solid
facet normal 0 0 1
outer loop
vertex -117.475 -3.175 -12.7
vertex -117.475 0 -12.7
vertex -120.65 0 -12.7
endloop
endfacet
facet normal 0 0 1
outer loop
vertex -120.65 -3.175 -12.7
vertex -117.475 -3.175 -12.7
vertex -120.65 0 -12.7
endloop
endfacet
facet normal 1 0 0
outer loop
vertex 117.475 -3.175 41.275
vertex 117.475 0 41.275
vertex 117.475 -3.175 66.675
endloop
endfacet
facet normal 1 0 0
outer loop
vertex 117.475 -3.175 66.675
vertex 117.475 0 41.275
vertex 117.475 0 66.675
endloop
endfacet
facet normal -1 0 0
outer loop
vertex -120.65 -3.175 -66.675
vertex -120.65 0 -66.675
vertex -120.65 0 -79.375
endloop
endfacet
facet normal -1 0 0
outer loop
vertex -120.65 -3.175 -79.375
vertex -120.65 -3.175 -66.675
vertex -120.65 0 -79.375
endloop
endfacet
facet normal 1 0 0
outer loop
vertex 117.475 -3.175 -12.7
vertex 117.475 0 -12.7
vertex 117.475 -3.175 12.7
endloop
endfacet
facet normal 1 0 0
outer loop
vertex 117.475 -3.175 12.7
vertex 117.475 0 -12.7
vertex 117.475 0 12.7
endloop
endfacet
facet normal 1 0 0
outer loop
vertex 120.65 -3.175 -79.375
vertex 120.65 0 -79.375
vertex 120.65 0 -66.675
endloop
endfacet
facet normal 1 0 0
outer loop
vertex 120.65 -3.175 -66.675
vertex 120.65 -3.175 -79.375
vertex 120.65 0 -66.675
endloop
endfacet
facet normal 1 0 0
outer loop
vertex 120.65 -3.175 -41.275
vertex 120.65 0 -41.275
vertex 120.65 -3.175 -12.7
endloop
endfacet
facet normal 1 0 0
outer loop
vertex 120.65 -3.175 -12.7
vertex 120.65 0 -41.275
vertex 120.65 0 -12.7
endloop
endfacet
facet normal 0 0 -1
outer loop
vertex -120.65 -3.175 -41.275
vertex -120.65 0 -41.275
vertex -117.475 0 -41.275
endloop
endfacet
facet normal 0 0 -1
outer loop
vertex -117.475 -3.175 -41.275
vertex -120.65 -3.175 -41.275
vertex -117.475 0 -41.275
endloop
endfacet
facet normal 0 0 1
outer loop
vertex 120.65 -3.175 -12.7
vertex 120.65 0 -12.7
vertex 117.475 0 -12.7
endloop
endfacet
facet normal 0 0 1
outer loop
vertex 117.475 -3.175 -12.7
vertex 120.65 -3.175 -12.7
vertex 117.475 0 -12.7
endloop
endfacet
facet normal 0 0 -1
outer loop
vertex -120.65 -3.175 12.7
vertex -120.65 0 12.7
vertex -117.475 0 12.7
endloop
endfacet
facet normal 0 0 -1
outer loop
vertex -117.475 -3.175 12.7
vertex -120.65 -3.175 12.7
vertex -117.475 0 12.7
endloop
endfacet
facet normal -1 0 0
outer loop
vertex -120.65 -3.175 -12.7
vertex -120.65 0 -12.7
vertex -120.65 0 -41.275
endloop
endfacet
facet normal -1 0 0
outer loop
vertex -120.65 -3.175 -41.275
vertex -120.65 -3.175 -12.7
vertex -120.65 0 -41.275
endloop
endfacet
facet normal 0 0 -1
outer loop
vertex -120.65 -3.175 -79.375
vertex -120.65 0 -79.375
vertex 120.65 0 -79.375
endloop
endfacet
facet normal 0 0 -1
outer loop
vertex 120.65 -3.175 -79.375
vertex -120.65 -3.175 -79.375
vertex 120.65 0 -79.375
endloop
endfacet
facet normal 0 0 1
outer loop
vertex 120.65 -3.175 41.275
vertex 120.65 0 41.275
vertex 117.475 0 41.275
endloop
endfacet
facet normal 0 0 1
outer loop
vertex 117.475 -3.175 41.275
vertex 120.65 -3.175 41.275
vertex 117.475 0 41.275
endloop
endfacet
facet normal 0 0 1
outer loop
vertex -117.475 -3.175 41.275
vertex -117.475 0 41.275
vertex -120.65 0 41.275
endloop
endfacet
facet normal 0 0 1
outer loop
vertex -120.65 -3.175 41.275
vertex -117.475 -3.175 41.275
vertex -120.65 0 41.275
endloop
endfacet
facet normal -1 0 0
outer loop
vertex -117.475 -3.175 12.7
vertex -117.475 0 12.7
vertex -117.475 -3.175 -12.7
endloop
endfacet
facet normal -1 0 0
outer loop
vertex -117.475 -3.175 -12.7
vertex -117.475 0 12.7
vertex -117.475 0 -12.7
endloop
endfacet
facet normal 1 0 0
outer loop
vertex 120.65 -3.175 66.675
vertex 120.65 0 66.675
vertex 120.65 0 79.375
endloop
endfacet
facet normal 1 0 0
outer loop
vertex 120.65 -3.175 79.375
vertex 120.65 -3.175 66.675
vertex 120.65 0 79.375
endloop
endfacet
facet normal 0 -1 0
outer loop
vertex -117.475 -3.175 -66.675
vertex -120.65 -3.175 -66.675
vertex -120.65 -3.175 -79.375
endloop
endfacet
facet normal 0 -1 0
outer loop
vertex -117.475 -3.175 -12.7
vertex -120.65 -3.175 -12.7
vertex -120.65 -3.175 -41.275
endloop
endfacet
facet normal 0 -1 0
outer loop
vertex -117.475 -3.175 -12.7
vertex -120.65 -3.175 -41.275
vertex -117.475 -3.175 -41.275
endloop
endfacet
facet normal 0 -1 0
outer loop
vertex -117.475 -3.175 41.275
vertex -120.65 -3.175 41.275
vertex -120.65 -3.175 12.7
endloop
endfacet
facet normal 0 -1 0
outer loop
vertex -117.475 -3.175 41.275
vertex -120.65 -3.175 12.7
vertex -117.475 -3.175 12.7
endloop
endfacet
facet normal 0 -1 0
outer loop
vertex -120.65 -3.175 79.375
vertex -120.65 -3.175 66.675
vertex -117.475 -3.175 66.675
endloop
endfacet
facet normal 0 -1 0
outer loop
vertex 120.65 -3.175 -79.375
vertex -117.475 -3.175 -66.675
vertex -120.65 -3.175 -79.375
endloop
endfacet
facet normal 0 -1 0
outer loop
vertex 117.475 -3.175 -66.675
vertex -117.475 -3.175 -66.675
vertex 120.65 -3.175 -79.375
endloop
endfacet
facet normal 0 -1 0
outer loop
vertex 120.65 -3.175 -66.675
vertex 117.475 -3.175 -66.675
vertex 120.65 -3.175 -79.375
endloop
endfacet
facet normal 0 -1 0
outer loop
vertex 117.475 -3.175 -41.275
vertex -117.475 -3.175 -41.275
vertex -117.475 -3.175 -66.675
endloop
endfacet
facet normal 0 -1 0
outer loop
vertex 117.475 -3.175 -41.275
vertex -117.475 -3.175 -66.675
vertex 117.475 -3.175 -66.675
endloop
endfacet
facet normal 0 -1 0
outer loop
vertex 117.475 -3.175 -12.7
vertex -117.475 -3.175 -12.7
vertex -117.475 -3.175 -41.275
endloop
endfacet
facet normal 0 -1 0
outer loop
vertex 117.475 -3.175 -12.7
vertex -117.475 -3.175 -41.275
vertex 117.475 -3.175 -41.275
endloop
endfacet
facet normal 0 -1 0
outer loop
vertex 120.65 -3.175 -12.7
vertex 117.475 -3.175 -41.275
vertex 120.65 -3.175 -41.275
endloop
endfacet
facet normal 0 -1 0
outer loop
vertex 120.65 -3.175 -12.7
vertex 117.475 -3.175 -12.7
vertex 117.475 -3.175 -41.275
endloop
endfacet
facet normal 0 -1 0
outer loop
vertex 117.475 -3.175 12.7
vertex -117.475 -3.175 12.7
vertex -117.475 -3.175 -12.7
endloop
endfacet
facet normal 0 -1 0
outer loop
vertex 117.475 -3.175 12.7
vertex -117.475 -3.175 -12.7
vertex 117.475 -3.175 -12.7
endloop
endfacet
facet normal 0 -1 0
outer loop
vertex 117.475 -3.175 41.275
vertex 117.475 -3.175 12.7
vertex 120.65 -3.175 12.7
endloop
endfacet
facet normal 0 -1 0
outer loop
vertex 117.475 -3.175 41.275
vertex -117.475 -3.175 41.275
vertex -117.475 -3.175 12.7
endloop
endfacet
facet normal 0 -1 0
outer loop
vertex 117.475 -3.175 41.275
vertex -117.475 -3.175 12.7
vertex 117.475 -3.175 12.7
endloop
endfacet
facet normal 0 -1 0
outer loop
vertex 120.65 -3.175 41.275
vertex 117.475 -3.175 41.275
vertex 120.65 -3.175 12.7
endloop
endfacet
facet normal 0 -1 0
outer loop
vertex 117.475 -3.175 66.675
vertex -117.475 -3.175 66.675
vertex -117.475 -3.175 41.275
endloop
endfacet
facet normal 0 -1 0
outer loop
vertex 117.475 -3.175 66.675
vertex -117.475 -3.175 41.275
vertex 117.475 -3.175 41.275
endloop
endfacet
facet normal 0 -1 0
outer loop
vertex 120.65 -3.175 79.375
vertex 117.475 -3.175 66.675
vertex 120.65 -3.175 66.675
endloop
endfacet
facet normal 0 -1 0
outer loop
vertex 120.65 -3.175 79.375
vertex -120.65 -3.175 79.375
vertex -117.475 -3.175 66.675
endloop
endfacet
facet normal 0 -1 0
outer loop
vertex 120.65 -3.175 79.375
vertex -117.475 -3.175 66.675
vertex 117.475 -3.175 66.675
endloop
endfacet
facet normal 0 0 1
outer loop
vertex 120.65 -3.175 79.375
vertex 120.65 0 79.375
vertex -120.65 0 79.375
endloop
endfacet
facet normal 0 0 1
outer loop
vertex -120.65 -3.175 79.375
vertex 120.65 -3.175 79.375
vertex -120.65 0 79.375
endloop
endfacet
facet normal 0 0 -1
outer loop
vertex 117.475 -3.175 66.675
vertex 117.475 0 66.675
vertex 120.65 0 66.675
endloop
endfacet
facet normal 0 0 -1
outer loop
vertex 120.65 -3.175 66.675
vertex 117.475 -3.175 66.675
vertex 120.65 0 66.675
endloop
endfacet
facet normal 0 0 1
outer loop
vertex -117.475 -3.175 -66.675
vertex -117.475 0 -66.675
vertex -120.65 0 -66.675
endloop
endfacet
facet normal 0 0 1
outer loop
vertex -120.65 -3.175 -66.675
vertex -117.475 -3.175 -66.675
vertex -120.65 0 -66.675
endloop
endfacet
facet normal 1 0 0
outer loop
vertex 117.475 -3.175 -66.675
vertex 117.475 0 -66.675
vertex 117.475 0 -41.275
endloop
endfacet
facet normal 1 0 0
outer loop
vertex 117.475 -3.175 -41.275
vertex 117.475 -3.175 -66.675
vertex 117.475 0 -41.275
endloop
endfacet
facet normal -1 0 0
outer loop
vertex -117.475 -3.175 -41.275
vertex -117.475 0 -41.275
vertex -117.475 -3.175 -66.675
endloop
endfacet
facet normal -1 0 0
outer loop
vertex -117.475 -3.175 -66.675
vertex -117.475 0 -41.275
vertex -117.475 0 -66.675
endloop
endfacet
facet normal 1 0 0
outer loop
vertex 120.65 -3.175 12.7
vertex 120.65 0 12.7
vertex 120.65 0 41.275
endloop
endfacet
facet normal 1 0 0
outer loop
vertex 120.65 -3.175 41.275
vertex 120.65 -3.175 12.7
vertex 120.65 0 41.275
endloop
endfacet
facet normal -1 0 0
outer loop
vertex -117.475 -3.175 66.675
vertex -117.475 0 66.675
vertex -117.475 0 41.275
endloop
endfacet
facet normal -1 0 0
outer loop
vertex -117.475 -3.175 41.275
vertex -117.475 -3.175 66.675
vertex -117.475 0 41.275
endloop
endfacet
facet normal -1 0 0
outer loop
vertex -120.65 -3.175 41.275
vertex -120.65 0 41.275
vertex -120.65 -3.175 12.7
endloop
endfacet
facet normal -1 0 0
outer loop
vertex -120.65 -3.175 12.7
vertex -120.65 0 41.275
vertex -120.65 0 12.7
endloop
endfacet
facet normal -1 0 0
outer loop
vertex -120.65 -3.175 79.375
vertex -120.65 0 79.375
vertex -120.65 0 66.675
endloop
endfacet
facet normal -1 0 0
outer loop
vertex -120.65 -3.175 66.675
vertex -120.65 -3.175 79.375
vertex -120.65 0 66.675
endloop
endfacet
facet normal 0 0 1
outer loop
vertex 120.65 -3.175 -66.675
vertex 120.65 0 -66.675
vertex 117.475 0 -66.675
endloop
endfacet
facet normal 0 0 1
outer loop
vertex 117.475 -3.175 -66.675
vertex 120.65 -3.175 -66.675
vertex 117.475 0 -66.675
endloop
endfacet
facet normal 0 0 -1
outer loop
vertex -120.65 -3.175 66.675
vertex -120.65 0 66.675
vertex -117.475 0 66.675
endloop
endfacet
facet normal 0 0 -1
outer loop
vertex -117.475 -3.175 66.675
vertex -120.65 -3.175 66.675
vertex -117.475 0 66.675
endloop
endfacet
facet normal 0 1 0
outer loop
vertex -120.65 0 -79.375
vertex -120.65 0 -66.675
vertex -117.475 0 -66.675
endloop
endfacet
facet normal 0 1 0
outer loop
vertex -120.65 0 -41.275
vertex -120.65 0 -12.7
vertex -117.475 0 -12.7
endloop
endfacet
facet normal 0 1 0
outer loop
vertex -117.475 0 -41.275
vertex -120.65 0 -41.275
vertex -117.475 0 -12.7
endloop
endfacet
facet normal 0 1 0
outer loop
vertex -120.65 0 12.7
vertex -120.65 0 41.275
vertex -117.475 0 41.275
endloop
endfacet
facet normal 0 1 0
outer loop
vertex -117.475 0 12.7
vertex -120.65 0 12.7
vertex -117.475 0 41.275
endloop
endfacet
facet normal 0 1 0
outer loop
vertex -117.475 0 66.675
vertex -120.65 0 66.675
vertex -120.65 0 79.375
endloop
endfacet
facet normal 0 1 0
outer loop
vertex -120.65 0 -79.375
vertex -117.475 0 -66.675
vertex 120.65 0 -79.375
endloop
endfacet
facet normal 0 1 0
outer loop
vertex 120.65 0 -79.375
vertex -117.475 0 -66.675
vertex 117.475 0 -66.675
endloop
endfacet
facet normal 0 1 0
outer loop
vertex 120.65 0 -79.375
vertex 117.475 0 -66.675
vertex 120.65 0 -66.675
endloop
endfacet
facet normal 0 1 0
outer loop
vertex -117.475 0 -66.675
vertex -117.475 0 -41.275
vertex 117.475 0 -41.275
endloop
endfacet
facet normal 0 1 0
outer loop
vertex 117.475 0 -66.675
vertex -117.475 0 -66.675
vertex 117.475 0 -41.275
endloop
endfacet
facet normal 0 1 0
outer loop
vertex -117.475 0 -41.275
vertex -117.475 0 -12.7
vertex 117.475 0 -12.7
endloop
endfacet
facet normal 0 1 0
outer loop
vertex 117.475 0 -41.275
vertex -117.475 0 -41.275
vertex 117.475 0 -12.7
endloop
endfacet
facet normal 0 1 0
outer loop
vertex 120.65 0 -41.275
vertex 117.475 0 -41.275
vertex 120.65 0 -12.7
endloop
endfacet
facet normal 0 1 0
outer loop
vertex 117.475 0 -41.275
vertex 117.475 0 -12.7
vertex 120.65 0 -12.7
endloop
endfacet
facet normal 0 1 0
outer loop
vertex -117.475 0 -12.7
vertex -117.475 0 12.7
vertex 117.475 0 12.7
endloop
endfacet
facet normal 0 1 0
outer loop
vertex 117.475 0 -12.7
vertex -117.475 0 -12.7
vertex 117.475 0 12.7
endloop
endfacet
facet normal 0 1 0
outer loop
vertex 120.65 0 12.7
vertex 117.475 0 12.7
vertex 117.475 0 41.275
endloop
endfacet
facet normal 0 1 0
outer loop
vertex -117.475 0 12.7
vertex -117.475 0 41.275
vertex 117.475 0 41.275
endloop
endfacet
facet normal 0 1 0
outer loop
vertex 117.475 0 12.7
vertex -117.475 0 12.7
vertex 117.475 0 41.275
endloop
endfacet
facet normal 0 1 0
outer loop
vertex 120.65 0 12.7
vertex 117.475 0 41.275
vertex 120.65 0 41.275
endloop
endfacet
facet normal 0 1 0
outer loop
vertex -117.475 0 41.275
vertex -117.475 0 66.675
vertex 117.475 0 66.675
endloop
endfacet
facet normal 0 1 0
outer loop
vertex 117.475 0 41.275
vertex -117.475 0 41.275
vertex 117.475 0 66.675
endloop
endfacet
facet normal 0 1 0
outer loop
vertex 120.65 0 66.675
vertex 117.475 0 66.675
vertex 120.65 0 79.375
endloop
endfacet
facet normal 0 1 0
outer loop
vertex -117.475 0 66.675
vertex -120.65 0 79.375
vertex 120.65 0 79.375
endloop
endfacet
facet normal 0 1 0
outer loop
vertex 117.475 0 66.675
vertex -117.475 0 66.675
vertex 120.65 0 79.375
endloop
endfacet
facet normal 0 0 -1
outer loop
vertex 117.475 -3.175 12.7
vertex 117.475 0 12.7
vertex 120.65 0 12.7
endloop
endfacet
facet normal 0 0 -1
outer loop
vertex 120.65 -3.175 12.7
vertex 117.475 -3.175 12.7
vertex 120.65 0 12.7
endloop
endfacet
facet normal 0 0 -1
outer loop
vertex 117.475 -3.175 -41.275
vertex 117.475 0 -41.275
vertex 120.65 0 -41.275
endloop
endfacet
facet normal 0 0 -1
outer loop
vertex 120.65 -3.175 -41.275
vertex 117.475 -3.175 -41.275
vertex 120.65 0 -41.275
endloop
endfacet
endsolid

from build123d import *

# Parameters (mm, degrees)
F1_DEPTH = 3.175


with BuildPart() as f1:
    # F0 (on Front) → F1 (new body)
    with BuildSketch(Plane.XZ):
        Polygon((-120.65, -79.375), (120.65, -79.375), (120.65, -66.675), (117.475, -66.675), (117.475, -41.275), (120.65, -41.275), (120.65, -12.7), (117.475, -12.7), (117.475, 0), (117.475, 12.7), (120.65, 12.7), (120.65, 41.275), (117.475, 41.275), (117.475, 66.675), (120.65, 66.675), (120.65, 79.375), (-120.65, 79.375), (-120.65, 66.675), (-117.475, 66.675), (-117.475, 41.275), (-120.65, 41.275), (-120.65, 12.7), (-117.475, 12.7), (-117.475, 0), (-117.475, -12.7), (-120.65, -12.7), (-120.65, -41.275), (-117.475, -41.275), (-117.475, -66.675), (-120.65, -66.675), align=None)
    extrude(amount=F1_DEPTH)


solid = f1.part
